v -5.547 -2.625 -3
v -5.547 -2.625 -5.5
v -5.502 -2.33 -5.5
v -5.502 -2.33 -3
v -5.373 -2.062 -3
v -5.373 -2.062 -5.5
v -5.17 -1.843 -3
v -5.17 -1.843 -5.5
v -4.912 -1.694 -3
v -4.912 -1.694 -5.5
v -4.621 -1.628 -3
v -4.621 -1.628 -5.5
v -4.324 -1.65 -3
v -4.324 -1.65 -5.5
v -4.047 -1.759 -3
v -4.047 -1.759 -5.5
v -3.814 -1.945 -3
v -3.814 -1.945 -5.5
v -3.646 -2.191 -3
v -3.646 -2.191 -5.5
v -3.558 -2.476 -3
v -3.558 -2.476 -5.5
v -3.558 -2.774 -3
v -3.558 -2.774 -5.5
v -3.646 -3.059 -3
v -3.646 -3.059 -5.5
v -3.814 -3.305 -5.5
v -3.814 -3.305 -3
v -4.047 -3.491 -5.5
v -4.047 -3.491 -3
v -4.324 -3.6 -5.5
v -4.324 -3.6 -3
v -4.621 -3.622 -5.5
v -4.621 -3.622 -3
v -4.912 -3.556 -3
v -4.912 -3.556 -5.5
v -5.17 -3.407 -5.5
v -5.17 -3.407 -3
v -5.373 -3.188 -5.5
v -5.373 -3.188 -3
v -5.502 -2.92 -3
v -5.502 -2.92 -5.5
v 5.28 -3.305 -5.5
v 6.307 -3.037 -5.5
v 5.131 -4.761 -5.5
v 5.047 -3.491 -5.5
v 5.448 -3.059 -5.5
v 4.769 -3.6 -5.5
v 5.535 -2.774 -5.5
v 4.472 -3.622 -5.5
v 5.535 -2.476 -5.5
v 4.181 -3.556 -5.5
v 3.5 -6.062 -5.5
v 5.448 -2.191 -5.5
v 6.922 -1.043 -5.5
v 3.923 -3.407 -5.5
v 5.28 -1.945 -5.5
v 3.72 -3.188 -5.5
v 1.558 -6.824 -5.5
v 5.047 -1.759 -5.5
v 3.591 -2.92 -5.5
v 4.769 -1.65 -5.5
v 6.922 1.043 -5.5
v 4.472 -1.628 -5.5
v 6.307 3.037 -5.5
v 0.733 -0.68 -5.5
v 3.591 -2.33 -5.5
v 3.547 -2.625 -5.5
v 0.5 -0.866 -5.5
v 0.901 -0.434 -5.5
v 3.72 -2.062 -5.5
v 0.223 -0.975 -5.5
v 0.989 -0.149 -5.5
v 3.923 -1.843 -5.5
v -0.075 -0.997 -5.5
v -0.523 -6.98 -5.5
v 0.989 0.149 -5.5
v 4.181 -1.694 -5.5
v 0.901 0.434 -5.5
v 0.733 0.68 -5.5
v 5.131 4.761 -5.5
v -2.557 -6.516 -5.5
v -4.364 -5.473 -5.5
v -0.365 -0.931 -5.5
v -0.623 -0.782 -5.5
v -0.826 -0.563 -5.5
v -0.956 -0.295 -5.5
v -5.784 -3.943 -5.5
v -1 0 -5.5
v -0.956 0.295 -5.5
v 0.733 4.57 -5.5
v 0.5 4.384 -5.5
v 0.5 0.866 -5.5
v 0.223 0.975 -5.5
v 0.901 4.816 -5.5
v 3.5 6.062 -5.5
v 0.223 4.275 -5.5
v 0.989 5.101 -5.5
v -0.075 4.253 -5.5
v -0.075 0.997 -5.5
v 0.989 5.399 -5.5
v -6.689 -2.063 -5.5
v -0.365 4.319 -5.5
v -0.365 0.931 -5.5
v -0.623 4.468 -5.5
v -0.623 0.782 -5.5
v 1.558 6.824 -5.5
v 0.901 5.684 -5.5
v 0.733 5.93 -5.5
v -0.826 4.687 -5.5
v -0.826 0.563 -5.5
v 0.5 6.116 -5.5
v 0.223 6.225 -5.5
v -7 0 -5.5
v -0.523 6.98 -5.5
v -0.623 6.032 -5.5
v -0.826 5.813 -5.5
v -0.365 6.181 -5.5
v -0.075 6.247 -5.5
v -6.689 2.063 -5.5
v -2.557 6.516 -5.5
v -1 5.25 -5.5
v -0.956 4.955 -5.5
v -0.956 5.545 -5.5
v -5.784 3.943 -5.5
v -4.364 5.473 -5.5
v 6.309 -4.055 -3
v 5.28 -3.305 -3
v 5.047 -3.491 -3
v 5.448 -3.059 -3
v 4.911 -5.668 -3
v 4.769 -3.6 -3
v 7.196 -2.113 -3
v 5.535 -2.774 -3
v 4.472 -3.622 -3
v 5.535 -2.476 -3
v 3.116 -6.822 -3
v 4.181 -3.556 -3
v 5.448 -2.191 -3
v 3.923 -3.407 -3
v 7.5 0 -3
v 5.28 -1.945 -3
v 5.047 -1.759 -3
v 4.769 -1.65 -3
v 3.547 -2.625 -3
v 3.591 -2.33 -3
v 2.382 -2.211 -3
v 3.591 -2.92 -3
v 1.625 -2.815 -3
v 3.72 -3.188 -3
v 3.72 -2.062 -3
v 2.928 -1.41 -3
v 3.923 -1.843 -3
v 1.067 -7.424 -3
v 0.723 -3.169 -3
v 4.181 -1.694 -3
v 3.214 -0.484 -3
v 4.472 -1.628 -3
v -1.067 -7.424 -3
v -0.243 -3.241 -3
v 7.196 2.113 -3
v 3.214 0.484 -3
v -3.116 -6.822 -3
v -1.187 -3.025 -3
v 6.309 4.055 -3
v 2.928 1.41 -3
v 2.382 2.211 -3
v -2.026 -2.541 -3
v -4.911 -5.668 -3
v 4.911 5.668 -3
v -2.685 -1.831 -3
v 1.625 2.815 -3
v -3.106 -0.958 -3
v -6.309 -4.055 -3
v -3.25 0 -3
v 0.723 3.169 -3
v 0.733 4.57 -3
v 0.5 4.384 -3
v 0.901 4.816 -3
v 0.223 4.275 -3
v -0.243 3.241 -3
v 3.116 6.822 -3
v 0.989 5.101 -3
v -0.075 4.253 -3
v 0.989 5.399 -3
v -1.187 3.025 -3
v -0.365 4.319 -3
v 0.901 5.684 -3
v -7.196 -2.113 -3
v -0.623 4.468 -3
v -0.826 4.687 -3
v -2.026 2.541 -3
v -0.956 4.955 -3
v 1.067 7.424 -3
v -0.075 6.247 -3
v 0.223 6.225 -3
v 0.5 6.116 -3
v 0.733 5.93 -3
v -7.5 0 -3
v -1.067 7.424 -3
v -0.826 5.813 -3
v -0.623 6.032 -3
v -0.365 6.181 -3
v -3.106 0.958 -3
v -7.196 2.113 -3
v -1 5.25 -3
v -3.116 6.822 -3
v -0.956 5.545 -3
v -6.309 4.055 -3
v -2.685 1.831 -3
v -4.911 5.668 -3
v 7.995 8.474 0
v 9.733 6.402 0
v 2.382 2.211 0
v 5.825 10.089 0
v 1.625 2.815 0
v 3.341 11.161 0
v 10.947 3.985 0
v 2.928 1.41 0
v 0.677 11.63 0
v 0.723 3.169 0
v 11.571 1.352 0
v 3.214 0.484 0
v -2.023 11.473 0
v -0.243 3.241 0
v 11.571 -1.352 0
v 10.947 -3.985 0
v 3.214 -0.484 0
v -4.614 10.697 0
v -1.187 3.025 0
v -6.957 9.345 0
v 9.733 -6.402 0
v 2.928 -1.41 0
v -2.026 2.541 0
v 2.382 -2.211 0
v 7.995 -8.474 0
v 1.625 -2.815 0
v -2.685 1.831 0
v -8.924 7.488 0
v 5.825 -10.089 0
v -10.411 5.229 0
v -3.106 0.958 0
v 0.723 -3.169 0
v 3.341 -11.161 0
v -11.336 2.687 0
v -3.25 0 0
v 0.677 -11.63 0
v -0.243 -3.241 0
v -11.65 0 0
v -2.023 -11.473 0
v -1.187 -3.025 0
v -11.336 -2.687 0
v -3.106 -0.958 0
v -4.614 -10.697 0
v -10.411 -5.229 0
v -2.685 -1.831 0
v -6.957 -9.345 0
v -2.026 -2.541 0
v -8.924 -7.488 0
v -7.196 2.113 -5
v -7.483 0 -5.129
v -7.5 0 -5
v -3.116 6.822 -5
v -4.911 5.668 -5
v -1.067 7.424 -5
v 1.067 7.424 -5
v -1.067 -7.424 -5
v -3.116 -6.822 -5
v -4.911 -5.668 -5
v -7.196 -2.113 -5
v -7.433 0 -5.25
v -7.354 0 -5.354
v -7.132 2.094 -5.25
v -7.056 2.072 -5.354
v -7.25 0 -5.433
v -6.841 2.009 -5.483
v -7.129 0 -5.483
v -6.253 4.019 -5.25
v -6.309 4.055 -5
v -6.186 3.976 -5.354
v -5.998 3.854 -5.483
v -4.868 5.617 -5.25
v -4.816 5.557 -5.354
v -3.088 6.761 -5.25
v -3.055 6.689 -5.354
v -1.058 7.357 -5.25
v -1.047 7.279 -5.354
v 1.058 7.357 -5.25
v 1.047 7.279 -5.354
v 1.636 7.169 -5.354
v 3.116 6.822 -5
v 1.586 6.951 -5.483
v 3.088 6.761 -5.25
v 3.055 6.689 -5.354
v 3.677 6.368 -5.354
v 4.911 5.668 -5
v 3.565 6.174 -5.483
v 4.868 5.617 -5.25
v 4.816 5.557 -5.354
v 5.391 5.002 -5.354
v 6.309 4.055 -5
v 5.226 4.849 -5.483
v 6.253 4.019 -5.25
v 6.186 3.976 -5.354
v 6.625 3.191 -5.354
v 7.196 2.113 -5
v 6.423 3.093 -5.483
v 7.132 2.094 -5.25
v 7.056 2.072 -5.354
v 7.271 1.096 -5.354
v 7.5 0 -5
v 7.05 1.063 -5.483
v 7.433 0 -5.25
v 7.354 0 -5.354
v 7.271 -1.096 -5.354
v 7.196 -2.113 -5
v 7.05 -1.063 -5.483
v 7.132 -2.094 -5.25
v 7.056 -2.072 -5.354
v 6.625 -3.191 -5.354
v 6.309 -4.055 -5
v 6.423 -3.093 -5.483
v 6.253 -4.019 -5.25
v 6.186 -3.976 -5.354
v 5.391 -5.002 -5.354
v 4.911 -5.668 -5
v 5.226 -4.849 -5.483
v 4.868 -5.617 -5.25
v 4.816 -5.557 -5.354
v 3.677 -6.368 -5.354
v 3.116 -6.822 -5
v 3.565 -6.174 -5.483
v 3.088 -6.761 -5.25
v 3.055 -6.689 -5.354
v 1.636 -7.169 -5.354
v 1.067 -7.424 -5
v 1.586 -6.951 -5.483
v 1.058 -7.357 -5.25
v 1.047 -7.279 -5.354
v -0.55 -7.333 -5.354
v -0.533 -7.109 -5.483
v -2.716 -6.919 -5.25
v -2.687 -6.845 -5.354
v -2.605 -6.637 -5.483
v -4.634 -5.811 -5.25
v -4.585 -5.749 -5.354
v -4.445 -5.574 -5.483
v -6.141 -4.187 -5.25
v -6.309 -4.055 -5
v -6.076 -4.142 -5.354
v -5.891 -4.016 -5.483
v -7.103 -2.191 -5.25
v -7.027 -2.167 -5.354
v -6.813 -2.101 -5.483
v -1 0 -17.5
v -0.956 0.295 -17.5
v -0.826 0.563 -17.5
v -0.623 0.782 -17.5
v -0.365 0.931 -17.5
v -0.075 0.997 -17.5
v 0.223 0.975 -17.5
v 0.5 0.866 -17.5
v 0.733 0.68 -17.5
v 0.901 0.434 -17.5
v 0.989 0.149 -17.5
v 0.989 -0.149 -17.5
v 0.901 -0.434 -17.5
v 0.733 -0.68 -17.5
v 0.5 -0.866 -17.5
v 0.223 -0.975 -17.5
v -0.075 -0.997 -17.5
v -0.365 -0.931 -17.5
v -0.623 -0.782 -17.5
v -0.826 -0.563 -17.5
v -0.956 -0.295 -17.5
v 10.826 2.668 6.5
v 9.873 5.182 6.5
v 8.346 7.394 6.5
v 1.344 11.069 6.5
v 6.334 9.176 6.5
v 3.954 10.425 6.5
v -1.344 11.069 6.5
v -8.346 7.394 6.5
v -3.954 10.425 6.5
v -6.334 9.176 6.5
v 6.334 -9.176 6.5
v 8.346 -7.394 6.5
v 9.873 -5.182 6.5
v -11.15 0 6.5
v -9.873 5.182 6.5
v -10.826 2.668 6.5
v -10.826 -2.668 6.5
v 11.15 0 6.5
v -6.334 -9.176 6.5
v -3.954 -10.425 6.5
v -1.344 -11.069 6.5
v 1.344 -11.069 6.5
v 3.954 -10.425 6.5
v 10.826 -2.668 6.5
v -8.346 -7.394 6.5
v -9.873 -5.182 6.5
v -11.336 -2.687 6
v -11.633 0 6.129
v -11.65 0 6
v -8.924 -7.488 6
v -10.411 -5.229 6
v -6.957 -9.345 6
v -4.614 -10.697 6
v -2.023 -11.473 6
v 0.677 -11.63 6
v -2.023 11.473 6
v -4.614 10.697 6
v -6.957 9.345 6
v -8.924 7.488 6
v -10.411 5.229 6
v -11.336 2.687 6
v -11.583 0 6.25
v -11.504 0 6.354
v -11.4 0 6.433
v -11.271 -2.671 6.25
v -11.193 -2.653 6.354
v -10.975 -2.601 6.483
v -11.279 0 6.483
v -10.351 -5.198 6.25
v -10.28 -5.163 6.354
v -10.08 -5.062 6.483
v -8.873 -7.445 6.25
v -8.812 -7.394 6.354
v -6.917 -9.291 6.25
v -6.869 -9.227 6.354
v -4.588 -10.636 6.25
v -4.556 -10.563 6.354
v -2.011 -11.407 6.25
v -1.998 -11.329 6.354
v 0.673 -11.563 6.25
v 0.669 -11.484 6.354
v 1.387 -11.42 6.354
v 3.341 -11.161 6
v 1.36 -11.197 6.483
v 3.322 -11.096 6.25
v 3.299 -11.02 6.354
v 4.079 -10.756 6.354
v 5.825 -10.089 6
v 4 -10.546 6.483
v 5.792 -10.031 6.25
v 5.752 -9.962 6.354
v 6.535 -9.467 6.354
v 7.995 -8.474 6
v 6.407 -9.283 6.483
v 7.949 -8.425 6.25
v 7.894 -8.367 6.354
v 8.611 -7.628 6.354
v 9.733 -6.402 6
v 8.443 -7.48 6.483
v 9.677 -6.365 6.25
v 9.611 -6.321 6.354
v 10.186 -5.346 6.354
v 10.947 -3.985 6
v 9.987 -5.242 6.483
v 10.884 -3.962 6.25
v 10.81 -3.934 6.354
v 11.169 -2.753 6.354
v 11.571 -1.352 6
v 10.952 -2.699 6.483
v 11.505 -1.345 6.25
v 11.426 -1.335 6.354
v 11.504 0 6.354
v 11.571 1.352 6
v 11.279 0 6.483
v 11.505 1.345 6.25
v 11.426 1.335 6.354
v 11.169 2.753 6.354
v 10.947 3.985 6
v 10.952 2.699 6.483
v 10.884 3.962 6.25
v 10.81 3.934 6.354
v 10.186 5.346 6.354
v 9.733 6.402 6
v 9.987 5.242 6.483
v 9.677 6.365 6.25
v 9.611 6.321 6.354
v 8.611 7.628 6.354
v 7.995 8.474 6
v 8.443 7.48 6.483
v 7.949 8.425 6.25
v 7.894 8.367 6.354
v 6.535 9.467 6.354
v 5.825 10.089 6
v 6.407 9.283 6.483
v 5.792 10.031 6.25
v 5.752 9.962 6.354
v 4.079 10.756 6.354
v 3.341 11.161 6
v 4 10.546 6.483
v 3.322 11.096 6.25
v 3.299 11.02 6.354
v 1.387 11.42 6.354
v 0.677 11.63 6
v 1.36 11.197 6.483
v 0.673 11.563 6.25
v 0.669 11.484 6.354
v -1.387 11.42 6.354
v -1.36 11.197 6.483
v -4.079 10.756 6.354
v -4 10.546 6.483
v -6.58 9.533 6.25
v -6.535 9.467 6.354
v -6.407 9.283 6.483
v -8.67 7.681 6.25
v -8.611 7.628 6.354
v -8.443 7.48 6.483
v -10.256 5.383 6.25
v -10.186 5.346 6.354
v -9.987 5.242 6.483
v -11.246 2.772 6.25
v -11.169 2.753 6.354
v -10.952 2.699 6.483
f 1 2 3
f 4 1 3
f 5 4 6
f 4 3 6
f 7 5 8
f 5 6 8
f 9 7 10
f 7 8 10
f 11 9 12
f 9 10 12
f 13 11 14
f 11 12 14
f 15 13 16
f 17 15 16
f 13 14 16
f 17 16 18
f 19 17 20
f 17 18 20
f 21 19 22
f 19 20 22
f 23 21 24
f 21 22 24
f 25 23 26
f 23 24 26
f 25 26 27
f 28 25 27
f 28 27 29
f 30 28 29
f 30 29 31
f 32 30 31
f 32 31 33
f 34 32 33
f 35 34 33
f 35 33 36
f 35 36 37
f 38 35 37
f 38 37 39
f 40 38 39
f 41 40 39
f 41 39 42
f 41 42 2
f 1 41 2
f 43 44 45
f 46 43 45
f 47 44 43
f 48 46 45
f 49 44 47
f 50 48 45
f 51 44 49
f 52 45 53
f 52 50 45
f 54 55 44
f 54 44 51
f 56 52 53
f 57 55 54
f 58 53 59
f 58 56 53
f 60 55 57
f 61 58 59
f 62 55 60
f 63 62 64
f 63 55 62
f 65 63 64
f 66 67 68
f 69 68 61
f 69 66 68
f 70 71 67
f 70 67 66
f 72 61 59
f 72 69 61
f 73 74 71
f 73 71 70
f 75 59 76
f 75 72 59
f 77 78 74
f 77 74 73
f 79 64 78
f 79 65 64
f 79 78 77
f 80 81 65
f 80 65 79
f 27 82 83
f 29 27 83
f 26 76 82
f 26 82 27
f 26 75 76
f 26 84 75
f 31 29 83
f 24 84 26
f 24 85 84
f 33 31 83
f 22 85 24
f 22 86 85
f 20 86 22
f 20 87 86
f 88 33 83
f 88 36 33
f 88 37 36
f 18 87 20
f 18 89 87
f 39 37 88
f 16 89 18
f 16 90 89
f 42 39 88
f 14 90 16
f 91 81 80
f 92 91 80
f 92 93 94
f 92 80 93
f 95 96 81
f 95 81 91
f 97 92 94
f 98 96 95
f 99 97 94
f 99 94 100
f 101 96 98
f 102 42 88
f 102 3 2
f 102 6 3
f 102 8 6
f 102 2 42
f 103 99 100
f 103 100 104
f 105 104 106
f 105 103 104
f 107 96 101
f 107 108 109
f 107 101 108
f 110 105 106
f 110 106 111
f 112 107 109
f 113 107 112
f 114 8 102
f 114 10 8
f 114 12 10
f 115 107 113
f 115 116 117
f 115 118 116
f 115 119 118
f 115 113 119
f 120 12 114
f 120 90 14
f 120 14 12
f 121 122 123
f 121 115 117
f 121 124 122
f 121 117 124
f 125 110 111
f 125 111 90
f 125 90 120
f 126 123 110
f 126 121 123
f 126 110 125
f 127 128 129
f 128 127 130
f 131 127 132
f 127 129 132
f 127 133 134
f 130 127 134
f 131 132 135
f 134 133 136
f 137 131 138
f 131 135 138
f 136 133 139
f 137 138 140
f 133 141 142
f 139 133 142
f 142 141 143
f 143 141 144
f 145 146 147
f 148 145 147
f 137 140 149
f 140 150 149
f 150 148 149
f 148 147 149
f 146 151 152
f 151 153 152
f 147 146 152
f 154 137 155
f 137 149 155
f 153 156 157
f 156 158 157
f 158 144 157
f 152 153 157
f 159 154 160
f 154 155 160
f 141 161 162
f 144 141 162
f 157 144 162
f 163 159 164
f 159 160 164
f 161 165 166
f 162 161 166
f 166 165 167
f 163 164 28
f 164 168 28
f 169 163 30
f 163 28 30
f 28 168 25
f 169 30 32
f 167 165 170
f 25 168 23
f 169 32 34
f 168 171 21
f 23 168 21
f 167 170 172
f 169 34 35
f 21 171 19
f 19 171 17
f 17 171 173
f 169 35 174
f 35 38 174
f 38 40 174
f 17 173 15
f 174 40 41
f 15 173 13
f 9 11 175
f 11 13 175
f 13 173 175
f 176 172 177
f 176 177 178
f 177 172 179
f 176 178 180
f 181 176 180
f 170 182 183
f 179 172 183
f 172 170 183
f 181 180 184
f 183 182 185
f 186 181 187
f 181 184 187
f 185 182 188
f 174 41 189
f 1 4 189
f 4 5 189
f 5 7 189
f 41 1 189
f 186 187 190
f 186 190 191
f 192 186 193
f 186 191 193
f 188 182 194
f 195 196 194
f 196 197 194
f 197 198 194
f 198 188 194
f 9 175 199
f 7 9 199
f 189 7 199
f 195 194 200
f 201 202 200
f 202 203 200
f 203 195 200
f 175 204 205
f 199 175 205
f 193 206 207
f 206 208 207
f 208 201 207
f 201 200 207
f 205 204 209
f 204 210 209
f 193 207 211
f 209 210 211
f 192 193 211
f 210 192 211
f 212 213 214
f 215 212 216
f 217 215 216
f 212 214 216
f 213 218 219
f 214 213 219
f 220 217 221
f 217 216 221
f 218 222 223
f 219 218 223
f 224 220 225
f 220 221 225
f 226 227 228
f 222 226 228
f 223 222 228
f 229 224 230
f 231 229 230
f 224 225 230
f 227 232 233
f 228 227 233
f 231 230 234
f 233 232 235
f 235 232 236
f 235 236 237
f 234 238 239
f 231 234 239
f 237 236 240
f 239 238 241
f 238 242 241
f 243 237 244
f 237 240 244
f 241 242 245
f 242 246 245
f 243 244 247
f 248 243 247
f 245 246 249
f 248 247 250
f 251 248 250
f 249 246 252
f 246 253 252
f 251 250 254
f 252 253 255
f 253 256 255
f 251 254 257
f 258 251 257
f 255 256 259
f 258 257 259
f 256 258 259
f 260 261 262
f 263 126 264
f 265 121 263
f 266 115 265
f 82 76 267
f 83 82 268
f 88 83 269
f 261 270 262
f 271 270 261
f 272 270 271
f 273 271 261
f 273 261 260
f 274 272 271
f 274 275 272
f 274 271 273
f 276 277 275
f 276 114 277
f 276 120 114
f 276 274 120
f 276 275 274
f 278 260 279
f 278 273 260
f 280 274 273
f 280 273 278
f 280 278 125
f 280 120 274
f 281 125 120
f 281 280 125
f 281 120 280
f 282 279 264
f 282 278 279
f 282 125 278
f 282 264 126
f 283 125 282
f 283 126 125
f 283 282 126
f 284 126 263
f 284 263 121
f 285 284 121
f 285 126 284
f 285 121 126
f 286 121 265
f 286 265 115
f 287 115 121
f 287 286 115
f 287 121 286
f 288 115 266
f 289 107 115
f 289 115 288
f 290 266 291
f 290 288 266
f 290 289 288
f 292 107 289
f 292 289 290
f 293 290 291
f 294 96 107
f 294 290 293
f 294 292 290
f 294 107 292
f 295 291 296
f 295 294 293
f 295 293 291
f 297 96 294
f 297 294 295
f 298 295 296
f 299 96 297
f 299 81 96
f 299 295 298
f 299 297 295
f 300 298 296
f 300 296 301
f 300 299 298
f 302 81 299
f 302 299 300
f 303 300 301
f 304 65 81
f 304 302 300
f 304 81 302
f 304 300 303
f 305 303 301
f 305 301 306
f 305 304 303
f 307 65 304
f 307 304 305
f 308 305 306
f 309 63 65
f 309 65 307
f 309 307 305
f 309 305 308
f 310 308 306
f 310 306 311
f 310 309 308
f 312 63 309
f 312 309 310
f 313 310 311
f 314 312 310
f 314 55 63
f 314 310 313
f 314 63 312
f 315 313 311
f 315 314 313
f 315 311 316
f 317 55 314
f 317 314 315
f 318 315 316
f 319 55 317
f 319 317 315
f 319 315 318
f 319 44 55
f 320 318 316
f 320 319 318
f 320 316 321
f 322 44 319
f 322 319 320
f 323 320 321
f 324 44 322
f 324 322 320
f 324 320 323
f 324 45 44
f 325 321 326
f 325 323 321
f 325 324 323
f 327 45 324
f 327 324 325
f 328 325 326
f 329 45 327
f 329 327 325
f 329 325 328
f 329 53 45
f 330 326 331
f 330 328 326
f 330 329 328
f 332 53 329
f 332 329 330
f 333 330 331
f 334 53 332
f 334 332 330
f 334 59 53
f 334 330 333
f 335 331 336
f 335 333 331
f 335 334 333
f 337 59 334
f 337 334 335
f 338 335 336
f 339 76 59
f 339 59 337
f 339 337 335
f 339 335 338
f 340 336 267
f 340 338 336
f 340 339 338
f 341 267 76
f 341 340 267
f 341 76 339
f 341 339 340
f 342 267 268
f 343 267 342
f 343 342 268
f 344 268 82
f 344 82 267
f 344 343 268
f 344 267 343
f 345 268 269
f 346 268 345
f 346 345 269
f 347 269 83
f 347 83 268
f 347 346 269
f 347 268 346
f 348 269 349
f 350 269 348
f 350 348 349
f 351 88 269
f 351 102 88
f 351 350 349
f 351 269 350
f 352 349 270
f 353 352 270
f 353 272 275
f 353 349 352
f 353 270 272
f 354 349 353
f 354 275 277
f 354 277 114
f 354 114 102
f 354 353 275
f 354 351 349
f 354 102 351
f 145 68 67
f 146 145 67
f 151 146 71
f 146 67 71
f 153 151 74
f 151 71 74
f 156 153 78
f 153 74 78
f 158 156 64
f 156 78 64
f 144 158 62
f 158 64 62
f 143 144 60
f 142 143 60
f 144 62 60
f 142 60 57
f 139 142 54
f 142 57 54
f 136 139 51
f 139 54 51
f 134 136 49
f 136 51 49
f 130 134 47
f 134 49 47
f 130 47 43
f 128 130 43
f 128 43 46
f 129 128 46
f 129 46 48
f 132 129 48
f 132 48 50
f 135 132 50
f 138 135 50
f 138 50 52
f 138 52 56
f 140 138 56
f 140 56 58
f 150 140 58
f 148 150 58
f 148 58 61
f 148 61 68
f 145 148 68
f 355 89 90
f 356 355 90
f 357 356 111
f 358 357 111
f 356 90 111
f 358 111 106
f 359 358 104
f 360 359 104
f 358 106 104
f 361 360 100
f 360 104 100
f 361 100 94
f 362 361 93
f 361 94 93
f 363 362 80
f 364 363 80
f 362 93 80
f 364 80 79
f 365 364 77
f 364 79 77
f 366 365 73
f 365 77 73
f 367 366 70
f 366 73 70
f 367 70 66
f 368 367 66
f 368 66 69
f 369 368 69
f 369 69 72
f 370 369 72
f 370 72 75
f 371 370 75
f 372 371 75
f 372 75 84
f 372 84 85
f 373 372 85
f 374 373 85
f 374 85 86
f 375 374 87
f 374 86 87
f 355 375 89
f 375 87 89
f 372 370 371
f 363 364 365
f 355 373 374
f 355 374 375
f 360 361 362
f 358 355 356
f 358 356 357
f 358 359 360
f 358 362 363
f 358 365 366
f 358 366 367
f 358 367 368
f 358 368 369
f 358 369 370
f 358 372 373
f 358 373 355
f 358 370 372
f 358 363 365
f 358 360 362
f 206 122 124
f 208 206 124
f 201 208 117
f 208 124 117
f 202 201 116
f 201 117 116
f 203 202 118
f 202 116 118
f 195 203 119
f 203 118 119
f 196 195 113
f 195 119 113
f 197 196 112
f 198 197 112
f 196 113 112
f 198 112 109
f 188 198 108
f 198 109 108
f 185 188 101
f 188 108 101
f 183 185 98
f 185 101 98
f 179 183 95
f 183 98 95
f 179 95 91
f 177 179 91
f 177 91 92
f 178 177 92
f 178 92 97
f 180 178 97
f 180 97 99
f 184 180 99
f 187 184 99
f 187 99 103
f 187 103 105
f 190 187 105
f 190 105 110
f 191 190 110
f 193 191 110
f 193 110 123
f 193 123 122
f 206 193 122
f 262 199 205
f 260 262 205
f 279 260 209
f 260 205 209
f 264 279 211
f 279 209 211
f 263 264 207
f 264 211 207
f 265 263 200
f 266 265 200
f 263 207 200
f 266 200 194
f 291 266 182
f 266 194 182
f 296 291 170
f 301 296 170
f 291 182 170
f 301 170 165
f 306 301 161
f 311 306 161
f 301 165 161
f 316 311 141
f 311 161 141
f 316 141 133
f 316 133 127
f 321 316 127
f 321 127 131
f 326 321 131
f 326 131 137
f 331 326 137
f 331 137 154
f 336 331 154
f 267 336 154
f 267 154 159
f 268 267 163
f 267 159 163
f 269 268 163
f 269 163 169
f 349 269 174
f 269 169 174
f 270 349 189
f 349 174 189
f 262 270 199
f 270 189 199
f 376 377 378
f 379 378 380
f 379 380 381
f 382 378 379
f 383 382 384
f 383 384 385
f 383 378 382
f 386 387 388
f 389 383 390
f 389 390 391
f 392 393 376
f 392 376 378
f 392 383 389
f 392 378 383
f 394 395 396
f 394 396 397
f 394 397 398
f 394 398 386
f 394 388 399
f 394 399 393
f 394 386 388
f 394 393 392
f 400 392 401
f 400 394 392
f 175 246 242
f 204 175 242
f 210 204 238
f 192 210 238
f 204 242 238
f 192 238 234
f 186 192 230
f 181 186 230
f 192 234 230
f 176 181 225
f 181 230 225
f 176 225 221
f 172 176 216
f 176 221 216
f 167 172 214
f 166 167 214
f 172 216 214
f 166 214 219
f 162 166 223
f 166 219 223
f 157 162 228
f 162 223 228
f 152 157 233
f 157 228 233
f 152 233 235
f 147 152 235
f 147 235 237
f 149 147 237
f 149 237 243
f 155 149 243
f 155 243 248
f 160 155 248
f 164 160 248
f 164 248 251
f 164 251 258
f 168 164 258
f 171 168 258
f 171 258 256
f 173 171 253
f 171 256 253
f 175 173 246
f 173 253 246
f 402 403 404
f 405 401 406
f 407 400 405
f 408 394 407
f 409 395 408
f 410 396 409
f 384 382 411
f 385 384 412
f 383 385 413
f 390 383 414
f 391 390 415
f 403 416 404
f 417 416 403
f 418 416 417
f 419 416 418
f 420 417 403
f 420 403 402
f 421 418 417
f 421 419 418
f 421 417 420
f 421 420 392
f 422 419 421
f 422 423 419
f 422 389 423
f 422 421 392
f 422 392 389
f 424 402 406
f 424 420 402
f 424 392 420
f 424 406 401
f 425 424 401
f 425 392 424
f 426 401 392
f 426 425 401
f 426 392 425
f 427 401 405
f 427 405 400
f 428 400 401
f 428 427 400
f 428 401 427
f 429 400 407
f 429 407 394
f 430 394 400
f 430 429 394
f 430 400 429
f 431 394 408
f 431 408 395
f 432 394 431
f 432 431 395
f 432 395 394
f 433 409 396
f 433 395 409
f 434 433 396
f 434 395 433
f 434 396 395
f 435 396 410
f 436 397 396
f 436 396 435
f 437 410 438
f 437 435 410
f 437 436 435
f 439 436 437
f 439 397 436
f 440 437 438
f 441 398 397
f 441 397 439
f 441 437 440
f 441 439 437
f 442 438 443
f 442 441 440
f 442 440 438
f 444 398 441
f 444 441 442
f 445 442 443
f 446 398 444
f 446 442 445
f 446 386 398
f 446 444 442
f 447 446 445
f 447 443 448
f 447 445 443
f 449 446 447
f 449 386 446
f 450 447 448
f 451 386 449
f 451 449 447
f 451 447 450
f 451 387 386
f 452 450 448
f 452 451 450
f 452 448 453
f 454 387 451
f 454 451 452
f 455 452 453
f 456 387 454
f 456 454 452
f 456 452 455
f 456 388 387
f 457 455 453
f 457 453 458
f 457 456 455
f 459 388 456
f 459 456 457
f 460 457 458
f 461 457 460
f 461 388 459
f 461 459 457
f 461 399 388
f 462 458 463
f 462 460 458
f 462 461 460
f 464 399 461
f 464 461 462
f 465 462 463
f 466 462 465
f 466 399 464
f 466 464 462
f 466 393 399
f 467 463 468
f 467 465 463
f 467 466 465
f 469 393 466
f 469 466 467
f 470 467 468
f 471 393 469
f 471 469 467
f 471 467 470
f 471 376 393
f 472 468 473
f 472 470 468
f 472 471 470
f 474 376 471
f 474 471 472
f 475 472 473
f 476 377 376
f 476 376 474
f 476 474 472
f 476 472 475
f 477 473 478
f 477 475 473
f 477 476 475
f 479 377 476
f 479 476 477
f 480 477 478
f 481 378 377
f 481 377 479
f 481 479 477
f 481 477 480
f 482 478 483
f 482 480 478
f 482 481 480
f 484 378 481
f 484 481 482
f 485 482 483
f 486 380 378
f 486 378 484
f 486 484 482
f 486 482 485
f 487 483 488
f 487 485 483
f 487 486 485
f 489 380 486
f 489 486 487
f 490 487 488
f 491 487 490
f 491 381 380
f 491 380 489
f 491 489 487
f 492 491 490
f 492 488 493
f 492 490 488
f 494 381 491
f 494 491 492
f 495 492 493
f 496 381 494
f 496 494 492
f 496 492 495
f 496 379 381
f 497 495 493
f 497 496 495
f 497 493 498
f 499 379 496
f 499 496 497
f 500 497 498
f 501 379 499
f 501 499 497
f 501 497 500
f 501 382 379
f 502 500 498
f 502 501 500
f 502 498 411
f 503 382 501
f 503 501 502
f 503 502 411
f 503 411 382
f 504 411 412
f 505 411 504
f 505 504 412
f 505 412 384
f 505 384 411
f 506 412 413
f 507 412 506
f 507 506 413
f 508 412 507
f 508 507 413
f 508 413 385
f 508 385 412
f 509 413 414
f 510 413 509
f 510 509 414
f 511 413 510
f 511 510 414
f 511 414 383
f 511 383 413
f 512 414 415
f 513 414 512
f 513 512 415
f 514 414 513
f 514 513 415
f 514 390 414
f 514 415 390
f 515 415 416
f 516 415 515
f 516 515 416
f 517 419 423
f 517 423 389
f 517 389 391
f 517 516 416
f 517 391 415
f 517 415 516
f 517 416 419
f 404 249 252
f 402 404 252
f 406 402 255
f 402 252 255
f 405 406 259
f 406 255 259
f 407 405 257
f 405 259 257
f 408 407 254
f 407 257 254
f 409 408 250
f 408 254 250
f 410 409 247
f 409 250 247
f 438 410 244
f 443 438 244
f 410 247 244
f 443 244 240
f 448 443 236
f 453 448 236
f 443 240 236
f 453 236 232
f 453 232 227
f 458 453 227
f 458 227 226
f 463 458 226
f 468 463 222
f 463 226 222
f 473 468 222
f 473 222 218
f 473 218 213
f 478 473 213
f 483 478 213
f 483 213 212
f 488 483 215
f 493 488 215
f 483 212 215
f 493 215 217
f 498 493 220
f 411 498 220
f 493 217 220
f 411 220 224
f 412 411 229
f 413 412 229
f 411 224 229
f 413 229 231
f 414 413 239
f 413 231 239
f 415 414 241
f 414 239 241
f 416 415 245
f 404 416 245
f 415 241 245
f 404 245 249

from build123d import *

# Parameters (mm, degrees)
SKETCH1_R           = 11.65
BOSS_EXTRUDE1_DEPTH = 6.5
FILLET1_R           = 0.5
SKETCH2_R           = 3.25
BOSS_EXTRUDE2_DEPTH = 3
SKETCH3_R           = 7.5
BOSS_EXTRUDE3_DEPTH = 2.5
FILLET2_R           = 0.5
SKETCH4_R           = 1
BOSS_EXTRUDE4_DEPTH = 12
CUT_EXTRUDE1_REACH  = 22.382
SKETCH5_R           = 1


with BuildPart() as part:
    # Sketch1 → Boss-Extrude1 (new body)
    with BuildSketch(Plane.XY):
        with Locations(Location((0, 0, 0), (0, 0, 180))):
            Circle(SKETCH1_R)
    extrude(amount=BOSS_EXTRUDE1_DEPTH)

    # Fillet1
    fillet1_edges = [part.edges().sort_by_distance(p)[0] for p in [
        (11.65, 0, 6.5),
    ]]
    fillet(fillet1_edges, radius=FILLET1_R)

    # Sketch2 → Boss-Extrude2 (add)
    with BuildSketch(Plane(origin=(0, 0, 0), x_dir=(-1, 0, 0), z_dir=(0, 0, -1))):
        Circle(SKETCH2_R)
    extrude(amount=BOSS_EXTRUDE2_DEPTH)

    # Sketch3 → Boss-Extrude3 (add)
    with BuildSketch(Plane(origin=(0, 0, -3), x_dir=(-1, 0, 0), z_dir=(0, 0, -1))):
        Circle(SKETCH3_R)
    extrude(amount=BOSS_EXTRUDE3_DEPTH)

    # Fillet2
    fillet2_edges = [part.edges().sort_by_distance(p)[0] for p in [
        (7.5, 0, -5.5),
    ]]
    fillet(fillet2_edges, radius=FILLET2_R)

    # Sketch4 → Boss-Extrude4 (add)
    with BuildSketch(Plane(origin=(0, 0, -5.5), x_dir=(-1, 0, 0), z_dir=(0, 0, -1))):
        Circle(SKETCH4_R)
    extrude(amount=BOSS_EXTRUDE4_DEPTH)

    # Sketch5 → Cut-Extrude1 (cut, up to next)
    with BuildSketch(Plane(origin=(0, 0, -5.5), x_dir=(-1, 0, 0), z_dir=(0, 0, -1)), mode=Mode.PRIVATE) as cut_extrude1_sk1:
        with Locations((4.54663337, -2.625)):
            Circle(SKETCH5_R)
    cut_extrude1_tool1 = extrude(cut_extrude1_sk1.sketch, amount=-CUT_EXTRUDE1_REACH, mode=Mode.PRIVATE) & part.part
    # Sketch5 → Cut-Extrude1 (cut, up to next)
    with BuildSketch(Plane(origin=(0, 0, -5.5), x_dir=(-1, 0, 0), z_dir=(0, 0, -1)), mode=Mode.PRIVATE) as cut_extrude1_sk2:
        with Locations((0, 5.25)):
            Circle(SKETCH5_R)
    cut_extrude1_tool2 = extrude(cut_extrude1_sk2.sketch, amount=-CUT_EXTRUDE1_REACH, mode=Mode.PRIVATE) & part.part
    # Sketch5 → Cut-Extrude1 (cut, up to next)
    with BuildSketch(Plane(origin=(0, 0, -5.5), x_dir=(-1, 0, 0), z_dir=(0, 0, -1)), mode=Mode.PRIVATE) as cut_extrude1_sk3:
        with Locations((-4.54663337, -2.625)):
            Circle(SKETCH5_R)
    cut_extrude1_tool3 = extrude(cut_extrude1_sk3.sketch, amount=-CUT_EXTRUDE1_REACH, mode=Mode.PRIVATE) & part.part
    add(cut_extrude1_tool1.solids().sort_by_distance((-4.546633, -2.625, -5.5))[0], mode=Mode.SUBTRACT)
    add(cut_extrude1_tool2.solids().sort_by_distance((0, 5.25, -5.5))[0], mode=Mode.SUBTRACT)
    add(cut_extrude1_tool3.solids().sort_by_distance((4.546633, -2.625, -5.5))[0], mode=Mode.SUBTRACT)


solid = part.part
